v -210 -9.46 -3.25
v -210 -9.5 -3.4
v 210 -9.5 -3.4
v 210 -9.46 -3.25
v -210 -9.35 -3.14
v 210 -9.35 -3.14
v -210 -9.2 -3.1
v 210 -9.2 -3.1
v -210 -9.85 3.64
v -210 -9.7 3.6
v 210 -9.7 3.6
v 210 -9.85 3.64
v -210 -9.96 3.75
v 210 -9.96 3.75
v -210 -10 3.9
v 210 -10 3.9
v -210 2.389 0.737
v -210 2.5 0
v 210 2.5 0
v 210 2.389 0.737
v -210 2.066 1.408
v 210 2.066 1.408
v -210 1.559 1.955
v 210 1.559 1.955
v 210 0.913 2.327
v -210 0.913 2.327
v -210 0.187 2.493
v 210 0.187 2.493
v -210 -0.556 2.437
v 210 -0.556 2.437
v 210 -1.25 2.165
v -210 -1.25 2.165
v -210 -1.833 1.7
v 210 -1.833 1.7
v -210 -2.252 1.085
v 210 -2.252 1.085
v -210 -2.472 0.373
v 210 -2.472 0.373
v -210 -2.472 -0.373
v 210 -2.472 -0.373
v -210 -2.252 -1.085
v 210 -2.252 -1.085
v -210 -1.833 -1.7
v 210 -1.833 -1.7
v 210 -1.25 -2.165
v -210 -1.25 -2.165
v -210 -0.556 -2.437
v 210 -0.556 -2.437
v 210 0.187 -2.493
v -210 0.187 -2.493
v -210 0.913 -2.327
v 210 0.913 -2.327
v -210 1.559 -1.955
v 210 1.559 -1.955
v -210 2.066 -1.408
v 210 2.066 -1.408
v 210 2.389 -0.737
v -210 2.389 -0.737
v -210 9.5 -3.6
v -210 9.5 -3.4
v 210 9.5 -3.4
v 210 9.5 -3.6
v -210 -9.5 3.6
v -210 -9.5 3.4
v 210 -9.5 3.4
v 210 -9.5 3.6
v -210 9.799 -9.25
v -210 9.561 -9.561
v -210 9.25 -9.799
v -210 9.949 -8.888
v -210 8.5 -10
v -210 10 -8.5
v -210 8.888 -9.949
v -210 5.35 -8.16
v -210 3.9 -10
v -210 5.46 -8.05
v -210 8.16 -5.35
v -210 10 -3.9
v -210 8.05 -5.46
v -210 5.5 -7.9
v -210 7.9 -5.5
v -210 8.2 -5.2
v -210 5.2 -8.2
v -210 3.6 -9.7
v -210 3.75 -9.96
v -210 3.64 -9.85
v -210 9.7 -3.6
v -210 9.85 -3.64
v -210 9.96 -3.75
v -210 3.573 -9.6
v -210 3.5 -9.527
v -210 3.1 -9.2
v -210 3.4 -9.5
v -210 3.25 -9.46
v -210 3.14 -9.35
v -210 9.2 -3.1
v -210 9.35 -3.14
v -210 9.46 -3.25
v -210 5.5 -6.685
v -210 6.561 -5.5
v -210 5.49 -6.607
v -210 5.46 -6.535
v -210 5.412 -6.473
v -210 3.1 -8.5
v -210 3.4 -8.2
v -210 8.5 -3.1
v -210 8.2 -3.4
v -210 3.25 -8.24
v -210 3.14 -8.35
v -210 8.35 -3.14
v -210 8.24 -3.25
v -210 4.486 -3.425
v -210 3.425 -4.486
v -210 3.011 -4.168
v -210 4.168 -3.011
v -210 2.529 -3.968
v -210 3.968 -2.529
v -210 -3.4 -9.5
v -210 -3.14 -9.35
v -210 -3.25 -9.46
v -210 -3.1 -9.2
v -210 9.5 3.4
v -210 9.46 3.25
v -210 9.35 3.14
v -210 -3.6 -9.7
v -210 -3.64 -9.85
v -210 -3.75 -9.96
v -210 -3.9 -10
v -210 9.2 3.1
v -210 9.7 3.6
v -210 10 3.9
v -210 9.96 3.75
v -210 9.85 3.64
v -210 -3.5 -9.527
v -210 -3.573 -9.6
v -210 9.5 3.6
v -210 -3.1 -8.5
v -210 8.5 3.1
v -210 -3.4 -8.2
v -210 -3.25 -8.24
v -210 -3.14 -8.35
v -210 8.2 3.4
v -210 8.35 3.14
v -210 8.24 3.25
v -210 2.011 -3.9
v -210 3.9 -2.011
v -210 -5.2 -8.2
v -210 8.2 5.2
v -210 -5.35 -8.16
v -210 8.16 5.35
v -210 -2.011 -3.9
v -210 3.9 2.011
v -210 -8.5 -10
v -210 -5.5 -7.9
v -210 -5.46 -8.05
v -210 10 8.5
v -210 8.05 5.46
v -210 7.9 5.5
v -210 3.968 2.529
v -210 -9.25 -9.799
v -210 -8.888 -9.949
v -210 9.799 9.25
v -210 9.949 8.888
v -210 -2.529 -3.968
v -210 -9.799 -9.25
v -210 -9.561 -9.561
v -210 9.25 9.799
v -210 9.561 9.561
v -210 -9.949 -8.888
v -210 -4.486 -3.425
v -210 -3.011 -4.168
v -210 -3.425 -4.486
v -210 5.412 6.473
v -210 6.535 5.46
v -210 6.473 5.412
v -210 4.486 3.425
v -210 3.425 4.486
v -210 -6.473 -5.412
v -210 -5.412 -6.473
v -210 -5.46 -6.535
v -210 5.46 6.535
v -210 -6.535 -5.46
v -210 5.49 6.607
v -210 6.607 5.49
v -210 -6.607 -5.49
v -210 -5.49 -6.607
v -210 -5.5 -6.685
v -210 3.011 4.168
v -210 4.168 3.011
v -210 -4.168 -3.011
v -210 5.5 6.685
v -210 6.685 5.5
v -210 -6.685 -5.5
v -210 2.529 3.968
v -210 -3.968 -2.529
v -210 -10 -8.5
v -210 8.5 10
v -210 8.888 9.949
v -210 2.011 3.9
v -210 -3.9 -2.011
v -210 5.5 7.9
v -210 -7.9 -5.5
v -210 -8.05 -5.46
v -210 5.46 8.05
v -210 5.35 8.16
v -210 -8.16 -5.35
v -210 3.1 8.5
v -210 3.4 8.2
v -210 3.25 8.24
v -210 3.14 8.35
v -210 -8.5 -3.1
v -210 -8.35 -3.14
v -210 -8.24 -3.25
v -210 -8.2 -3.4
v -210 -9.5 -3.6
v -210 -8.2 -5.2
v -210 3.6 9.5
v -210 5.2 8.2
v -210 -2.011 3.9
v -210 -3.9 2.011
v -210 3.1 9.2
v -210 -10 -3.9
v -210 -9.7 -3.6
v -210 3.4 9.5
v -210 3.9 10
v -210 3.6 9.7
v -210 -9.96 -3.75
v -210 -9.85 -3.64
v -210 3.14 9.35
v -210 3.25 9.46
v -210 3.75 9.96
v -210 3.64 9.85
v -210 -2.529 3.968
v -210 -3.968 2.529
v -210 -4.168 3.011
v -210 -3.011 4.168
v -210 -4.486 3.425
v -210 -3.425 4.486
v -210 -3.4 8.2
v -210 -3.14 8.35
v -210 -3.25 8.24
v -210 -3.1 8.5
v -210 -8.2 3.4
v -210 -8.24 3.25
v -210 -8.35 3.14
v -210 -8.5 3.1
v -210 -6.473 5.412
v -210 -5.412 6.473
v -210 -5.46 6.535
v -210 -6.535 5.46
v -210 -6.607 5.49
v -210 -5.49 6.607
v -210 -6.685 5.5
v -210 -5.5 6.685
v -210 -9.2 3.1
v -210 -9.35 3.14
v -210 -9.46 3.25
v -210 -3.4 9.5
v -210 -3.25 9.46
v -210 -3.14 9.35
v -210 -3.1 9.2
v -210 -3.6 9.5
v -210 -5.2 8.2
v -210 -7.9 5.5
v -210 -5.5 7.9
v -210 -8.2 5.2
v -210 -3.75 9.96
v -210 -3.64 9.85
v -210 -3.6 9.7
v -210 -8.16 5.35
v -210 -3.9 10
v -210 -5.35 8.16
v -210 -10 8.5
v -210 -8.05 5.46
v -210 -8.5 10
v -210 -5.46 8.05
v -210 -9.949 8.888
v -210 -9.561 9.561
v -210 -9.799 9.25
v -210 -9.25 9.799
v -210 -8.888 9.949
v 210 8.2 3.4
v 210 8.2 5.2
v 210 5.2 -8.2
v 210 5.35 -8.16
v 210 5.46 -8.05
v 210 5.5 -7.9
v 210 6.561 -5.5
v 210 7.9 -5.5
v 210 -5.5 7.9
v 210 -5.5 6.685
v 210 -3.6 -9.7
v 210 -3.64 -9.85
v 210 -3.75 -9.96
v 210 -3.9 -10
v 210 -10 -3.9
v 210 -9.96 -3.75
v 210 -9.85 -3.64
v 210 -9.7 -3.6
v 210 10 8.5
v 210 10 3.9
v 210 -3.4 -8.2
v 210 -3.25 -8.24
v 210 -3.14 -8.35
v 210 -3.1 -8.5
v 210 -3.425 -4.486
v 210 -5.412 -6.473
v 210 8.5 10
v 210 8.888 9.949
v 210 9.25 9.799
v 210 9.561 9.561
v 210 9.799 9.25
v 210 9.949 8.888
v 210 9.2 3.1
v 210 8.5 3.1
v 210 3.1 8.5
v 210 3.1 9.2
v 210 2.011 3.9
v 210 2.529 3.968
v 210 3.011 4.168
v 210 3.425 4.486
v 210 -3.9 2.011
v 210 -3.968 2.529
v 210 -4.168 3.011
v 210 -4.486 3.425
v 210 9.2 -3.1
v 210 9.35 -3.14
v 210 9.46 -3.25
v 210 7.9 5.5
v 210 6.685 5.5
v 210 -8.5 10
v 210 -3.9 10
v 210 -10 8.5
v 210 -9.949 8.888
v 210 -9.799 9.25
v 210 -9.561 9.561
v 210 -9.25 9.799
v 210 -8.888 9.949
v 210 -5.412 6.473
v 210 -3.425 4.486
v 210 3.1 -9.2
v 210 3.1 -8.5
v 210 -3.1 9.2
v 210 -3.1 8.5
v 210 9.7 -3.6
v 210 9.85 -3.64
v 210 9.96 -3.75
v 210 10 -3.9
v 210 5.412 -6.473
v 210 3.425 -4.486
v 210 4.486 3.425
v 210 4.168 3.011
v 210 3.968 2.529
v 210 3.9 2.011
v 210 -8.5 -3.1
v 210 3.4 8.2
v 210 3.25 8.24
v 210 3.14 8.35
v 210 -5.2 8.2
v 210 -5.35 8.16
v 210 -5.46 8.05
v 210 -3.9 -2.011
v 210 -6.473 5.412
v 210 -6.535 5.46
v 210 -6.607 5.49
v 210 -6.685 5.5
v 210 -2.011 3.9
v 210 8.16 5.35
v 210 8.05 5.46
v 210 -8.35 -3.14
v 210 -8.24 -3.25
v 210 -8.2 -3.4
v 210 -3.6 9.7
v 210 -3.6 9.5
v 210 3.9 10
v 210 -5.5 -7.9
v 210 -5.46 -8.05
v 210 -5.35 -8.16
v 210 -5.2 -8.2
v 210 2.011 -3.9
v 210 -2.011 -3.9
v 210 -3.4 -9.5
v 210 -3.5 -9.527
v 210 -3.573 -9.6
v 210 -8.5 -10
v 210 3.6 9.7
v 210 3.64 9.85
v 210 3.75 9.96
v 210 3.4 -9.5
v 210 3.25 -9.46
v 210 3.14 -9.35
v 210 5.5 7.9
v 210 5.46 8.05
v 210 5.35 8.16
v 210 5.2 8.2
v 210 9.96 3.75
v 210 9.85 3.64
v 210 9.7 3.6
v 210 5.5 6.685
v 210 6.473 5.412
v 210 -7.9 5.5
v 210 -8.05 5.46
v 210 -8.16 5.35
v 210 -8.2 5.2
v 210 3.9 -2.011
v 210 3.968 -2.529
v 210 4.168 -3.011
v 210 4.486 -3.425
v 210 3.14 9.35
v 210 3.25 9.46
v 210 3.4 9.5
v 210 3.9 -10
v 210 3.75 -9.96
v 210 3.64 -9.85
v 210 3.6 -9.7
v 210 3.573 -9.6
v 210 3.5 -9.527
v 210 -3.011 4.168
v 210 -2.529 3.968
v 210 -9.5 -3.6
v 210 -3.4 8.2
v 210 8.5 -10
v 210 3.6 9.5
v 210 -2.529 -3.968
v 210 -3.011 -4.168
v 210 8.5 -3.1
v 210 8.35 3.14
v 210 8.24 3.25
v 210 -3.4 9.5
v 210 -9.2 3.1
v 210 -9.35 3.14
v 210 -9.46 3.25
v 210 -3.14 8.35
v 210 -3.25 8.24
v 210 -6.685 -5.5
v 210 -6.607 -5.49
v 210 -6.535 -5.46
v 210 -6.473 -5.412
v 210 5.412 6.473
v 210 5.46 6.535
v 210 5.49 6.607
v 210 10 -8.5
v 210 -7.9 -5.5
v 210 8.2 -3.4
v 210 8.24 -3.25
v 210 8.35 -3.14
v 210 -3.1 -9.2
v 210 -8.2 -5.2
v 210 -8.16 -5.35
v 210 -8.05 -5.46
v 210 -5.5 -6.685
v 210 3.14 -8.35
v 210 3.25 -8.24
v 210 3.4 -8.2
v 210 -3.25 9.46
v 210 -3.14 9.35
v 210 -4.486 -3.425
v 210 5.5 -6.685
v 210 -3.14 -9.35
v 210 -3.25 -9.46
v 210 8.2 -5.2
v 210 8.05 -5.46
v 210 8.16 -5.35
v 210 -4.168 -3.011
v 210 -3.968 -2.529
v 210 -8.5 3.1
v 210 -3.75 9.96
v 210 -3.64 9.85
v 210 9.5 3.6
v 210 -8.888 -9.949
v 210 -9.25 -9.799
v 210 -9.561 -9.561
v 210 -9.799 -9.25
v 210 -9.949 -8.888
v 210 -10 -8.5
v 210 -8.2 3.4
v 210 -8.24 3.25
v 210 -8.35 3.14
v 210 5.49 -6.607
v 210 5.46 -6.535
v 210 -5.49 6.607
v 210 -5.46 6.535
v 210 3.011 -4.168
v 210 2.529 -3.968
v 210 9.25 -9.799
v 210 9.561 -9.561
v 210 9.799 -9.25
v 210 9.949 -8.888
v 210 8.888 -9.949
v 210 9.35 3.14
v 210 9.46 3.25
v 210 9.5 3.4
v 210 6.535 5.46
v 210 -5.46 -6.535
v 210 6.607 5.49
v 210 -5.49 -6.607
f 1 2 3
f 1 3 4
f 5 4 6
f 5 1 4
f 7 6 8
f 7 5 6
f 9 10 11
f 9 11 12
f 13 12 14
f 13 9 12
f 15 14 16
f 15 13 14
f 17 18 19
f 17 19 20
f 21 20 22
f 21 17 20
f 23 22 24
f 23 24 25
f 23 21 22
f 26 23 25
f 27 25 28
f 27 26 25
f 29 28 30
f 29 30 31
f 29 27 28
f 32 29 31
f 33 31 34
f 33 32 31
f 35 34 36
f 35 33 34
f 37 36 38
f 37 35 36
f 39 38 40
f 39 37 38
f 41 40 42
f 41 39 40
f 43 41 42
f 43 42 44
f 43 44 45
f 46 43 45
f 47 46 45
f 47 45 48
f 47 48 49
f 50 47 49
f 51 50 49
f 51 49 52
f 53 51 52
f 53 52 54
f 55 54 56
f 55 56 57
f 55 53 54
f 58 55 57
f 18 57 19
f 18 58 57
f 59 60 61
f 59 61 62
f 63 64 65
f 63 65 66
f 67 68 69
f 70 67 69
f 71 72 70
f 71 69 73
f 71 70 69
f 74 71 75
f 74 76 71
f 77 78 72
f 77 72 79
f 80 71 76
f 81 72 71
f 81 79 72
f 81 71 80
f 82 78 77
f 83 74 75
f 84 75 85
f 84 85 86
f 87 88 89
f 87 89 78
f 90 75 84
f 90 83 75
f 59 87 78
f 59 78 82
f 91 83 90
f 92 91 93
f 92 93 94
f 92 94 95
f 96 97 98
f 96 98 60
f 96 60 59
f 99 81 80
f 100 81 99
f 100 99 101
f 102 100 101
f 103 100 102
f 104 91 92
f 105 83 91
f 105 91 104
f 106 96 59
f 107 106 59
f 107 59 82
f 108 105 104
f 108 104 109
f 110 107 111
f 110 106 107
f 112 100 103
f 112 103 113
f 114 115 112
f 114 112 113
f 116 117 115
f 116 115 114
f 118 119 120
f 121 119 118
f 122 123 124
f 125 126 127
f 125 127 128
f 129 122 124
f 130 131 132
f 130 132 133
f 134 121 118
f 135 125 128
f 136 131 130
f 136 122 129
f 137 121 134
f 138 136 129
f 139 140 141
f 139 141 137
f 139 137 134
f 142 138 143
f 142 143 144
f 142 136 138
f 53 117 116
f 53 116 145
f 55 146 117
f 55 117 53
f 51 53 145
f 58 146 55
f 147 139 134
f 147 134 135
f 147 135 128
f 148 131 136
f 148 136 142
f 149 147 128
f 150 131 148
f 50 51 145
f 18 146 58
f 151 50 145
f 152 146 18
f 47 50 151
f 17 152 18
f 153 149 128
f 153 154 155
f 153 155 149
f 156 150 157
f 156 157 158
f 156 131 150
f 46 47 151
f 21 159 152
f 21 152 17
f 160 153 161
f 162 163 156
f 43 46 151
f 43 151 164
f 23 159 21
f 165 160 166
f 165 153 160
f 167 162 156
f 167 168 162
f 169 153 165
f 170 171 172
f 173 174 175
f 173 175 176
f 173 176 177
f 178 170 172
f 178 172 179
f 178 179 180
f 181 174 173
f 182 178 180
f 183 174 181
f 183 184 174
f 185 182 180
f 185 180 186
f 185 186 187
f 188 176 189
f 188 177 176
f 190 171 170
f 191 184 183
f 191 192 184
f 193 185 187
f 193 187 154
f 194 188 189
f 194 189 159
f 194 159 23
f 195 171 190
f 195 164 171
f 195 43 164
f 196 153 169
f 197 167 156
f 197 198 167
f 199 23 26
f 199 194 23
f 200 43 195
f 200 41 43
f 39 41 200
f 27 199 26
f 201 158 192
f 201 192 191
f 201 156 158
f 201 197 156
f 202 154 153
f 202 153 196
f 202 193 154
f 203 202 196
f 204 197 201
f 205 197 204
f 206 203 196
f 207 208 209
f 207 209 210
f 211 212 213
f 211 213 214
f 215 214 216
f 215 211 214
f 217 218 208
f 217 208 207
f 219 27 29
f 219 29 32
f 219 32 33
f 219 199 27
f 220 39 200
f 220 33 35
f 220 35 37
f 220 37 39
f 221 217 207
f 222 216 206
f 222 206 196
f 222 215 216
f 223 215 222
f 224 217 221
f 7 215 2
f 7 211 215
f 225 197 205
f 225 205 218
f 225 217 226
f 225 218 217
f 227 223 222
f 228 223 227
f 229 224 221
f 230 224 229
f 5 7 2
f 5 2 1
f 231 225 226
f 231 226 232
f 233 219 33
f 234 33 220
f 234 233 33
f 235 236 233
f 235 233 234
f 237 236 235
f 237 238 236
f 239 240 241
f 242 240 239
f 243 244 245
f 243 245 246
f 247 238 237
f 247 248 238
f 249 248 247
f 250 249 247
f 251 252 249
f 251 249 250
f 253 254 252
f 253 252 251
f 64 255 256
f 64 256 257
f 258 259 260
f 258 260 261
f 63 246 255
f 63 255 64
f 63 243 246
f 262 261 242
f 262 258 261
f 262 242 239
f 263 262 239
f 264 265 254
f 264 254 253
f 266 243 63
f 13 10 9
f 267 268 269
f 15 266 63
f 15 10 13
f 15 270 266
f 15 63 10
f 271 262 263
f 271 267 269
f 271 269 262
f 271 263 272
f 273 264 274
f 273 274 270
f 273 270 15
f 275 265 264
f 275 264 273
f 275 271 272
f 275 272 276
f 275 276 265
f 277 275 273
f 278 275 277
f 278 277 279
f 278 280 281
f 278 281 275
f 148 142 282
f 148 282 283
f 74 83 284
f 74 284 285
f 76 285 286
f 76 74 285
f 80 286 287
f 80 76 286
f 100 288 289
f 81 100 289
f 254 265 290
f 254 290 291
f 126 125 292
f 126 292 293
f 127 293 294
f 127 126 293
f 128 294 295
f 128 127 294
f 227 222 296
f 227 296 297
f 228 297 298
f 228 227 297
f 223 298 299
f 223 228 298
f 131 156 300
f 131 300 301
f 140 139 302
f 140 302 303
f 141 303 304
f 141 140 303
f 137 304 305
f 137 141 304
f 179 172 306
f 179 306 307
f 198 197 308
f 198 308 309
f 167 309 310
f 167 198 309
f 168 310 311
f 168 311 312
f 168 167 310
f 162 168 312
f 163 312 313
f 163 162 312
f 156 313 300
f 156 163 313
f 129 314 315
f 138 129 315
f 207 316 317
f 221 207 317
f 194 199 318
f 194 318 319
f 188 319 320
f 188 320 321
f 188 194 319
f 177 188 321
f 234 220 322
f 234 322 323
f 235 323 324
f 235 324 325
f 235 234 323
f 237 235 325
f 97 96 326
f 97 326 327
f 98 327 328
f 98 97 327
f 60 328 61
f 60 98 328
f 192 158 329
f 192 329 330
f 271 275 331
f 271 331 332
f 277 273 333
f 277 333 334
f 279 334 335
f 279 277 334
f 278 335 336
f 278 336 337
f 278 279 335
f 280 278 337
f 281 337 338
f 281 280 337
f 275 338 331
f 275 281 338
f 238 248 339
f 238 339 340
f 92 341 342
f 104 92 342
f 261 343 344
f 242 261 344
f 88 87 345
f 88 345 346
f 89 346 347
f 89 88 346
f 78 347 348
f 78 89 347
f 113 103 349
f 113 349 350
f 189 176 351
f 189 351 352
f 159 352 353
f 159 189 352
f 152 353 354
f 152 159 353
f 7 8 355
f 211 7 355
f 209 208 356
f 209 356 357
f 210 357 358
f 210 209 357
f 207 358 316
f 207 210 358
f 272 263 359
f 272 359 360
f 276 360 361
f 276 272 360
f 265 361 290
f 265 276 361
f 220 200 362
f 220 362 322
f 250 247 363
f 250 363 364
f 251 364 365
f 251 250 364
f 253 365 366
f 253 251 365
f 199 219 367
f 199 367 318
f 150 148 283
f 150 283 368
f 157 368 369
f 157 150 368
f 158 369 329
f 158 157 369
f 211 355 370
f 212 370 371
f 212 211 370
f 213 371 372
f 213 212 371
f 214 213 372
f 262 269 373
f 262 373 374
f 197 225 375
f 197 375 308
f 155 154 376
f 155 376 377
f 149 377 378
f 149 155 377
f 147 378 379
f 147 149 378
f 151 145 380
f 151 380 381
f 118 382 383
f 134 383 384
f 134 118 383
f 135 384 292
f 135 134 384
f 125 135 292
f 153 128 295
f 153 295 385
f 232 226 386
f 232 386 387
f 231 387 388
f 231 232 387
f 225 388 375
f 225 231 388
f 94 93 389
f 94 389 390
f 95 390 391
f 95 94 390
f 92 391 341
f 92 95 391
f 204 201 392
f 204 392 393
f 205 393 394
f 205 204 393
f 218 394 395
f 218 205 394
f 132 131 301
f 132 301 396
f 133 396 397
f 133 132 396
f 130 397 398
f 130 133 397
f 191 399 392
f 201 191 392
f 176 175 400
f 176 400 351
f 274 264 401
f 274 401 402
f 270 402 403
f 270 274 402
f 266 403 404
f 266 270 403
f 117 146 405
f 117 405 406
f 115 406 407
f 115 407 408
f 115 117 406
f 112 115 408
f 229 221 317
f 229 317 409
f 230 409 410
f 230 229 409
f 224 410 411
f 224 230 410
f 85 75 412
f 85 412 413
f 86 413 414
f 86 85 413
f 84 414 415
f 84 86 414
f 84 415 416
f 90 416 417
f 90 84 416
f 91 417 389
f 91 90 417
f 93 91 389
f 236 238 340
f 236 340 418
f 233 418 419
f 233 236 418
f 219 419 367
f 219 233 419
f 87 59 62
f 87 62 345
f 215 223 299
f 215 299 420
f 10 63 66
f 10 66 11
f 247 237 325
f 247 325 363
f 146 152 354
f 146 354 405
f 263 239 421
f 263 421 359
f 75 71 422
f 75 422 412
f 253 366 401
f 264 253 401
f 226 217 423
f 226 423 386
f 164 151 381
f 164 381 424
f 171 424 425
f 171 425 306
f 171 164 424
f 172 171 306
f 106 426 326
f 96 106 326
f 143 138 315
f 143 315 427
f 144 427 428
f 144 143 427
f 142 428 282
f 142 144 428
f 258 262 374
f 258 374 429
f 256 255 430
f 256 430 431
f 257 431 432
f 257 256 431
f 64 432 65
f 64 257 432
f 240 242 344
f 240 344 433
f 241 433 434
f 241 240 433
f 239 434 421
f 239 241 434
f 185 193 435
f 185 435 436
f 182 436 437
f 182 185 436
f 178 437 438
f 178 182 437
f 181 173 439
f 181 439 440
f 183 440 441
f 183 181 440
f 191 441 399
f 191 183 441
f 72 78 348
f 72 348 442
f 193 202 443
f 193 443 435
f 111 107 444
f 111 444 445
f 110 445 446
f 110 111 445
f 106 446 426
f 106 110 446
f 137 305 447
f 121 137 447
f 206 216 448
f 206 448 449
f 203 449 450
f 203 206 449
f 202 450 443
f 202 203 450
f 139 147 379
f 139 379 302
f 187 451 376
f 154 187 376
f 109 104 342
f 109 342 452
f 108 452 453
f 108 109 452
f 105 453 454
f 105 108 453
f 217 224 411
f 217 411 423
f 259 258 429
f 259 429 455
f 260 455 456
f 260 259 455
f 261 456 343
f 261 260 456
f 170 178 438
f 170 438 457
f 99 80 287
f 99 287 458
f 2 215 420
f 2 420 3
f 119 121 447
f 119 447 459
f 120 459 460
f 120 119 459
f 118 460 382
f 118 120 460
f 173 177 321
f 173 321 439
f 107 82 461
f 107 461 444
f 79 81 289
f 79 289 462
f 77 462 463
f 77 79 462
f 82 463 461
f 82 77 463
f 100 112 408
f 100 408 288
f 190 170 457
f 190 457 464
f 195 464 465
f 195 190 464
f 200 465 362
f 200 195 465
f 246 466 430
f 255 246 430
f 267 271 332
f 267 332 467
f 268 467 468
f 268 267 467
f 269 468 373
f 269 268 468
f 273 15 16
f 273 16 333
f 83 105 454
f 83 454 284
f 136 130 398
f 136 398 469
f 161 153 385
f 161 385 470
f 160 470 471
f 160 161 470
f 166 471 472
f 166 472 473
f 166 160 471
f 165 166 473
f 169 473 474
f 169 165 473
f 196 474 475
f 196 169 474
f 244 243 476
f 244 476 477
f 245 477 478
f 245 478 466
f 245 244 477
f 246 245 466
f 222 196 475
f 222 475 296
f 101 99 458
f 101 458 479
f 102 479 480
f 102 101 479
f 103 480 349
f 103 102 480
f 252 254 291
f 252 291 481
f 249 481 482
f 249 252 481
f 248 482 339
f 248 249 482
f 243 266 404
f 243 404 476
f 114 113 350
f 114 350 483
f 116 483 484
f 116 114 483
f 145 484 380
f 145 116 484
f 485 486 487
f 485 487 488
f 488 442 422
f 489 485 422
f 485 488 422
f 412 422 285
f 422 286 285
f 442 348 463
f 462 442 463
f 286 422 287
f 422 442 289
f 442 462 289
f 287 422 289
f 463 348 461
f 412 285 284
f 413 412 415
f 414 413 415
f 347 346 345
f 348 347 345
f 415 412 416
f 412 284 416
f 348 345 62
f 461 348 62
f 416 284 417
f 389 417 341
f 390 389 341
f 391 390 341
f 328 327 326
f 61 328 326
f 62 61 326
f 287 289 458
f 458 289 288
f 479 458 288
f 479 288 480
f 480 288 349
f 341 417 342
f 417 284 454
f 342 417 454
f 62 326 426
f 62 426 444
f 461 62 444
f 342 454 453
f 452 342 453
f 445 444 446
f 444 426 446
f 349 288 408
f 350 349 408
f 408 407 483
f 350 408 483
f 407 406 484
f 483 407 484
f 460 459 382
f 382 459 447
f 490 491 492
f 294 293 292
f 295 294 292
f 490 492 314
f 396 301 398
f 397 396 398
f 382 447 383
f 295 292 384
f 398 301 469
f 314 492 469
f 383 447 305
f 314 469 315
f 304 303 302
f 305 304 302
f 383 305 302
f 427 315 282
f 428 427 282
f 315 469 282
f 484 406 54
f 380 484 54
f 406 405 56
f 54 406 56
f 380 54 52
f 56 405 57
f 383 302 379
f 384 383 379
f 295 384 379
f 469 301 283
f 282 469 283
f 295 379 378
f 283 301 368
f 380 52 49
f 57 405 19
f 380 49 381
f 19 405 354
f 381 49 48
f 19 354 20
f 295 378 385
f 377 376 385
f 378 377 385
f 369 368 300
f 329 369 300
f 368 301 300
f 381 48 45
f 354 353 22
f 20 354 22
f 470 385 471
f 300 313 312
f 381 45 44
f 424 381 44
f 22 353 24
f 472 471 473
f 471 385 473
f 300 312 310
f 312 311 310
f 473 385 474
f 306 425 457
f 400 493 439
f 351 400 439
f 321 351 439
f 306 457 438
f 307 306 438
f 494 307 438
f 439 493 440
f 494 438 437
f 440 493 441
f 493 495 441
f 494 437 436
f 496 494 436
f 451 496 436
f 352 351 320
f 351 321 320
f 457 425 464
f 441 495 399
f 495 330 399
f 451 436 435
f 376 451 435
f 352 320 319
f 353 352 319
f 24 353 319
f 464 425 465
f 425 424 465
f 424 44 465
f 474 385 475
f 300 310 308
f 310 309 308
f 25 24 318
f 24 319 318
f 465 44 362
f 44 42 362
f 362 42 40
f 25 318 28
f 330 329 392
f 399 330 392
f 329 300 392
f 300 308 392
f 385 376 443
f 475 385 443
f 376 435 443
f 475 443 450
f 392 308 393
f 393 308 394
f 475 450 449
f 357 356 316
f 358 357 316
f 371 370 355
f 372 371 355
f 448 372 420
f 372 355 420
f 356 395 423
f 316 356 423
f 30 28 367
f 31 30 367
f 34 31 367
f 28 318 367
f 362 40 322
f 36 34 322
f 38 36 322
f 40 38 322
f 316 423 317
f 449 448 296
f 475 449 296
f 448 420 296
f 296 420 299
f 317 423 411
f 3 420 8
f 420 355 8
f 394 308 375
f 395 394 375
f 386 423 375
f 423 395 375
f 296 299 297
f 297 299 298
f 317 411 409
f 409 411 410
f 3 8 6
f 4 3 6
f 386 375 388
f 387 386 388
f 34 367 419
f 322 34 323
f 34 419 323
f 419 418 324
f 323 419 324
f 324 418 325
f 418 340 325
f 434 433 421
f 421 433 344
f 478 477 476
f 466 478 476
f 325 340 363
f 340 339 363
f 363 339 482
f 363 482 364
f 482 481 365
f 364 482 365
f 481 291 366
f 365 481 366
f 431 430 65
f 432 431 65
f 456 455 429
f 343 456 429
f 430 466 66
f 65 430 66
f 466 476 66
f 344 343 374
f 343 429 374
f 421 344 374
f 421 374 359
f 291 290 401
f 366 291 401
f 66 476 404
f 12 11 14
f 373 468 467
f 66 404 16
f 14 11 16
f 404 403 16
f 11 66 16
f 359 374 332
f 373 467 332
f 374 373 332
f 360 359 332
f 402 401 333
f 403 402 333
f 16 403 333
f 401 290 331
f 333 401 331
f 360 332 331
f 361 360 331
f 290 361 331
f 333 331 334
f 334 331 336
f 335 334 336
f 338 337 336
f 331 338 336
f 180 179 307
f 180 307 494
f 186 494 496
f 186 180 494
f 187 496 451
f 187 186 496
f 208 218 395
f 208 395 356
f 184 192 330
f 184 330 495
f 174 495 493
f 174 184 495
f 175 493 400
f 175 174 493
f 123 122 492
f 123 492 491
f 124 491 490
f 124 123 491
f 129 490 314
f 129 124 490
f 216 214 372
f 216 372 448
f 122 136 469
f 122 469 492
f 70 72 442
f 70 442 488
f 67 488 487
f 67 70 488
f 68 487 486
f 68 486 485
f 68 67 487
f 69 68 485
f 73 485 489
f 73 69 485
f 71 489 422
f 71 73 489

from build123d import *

# Parameters (mm, degrees)
SKETCH_11_R         = 2.5
MEMBER_2020_1_DEPTH = 420


with BuildPart() as part:
    # 草图11 → Member 2020_1 (new body)
    with BuildSketch(Plane.YZ.offset(-210)):
        with BuildLine():
            Line((3.9, 0), (3.9, -2.010912703))
            ThreePointArc((3.9, -2.010912703), (4.052240935, -2.776279568), (4.485786438, -3.425126266))
            Line((4.485786438, -3.425126266), (6.560660172, -5.5))
            Line((6.560660172, -5.5), (7.9, -5.5))
            ThreePointArc((7.9, -5.5), (8.112132034, -5.412132034), (8.2, -5.2))
            Line((8.2, -5.2), (8.2, -3.4))
            ThreePointArc((8.2, -3.4), (8.287867966, -3.187867966), (8.5, -3.1))
            Line((8.5, -3.1), (9.2, -3.1))
            ThreePointArc((9.2, -3.1), (9.412132034, -3.187867966), (9.5, -3.4))
            Line((9.5, -3.4), (9.5, -3.6))
            Line((9.5, -3.6), (9.7, -3.6))
            ThreePointArc((9.7, -3.6), (9.912132034, -3.687867966), (10, -3.9))
            Line((10, -3.9), (10, -8.5))
            ThreePointArc((10, -8.5), (9.560660172, -9.560660172), (8.5, -10))
            Line((8.5, -10), (3.9, -10))
            ThreePointArc((3.9, -10), (3.687867966, -9.912132034), (3.6, -9.7))
            ThreePointArc((3.6, -9.7), (3.541421356, -9.558578644), (3.4, -9.5))
            ThreePointArc((3.4, -9.5), (3.187867966, -9.412132034), (3.1, -9.2))
            Line((3.1, -9.2), (3.1, -8.5))
            ThreePointArc((3.1, -8.5), (3.187867966, -8.287867966), (3.4, -8.2))
            Line((3.4, -8.2), (5.2, -8.2))
            ThreePointArc((5.2, -8.2), (5.412132034, -8.112132034), (5.5, -7.9))
            Line((5.5, -7.9), (5.5, -6.68492424))
            ThreePointArc((5.5, -6.68492424), (5.47716386, -6.570119211), (5.412132034, -6.472792206))
            Line((5.412132034, -6.472792206), (3.425126266, -4.485786438))
            ThreePointArc((3.425126266, -4.485786438), (2.776279568, -4.052240935), (2.010912703, -3.9))
            Line((2.010912703, -3.9), (0, -3.9))
            Line((0, -3.9), (-2.010912703, -3.9))
            ThreePointArc((-2.010912703, -3.9), (-2.776279568, -4.052240935), (-3.425126266, -4.485786438))
            Line((-3.425126266, -4.485786438), (-5.412132034, -6.472792206))
            ThreePointArc((-5.412132034, -6.472792206), (-5.47716386, -6.570119211), (-5.5, -6.68492424))
            Line((-5.5, -6.68492424), (-5.5, -7.9))
            ThreePointArc((-5.5, -7.9), (-5.412132034, -8.112132034), (-5.2, -8.2))
            Line((-5.2, -8.2), (-3.4, -8.2))
            ThreePointArc((-3.4, -8.2), (-3.187867966, -8.287867966), (-3.1, -8.5))
            Line((-3.1, -8.5), (-3.1, -9.2))
            ThreePointArc((-3.1, -9.2), (-3.187867966, -9.412132034), (-3.4, -9.5))
            ThreePointArc((-3.4, -9.5), (-3.541421356, -9.558578644), (-3.6, -9.7))
            ThreePointArc((-3.6, -9.7), (-3.687867966, -9.912132034), (-3.9, -10))
            Line((-3.9, -10), (-8.5, -10))
            ThreePointArc((-8.5, -10), (-9.560660172, -9.560660172), (-10, -8.5))
            Line((-10, -8.5), (-10, -3.9))
            ThreePointArc((-10, -3.9), (-9.912132034, -3.687867966), (-9.7, -3.6))
            Line((-9.7, -3.6), (-9.5, -3.6))
            Line((-9.5, -3.6), (-9.5, -3.4))
            ThreePointArc((-9.5, -3.4), (-9.412132034, -3.187867966), (-9.2, -3.1))
            Line((-9.2, -3.1), (-8.5, -3.1))
            ThreePointArc((-8.5, -3.1), (-8.287867965, -3.187867966), (-8.2, -3.4))
            Line((-8.2, -3.4), (-8.2, -5.2))
            ThreePointArc((-8.2, -5.2), (-8.112132034, -5.412132034), (-7.9, -5.5))
            Line((-7.9, -5.5), (-6.68492424, -5.5))
            ThreePointArc((-6.68492424, -5.5), (-6.570119211, -5.47716386), (-6.472792206, -5.412132034))
            Line((-6.472792206, -5.412132034), (-4.485786438, -3.425126266))
            ThreePointArc((-4.485786438, -3.425126266), (-4.052240935, -2.776279568), (-3.9, -2.010912703))
            Line((-3.9, -2.010912703), (-3.9, 0))
            Line((-3.9, 0), (-3.9, 2.010912703))
            ThreePointArc((-3.9, 2.010912703), (-4.052240935, 2.776279568), (-4.485786438, 3.425126266))
            Line((-4.485786438, 3.425126266), (-6.472792206, 5.412132034))
            ThreePointArc((-6.472792206, 5.412132034), (-6.570119211, 5.47716386), (-6.68492424, 5.5))
            Line((-6.68492424, 5.5), (-7.9, 5.5))
            ThreePointArc((-7.9, 5.5), (-8.112132034, 5.412132034), (-8.2, 5.2))
            Line((-8.2, 5.2), (-8.2, 3.4))
            ThreePointArc((-8.2, 3.4), (-8.287867965, 3.187867966), (-8.5, 3.1))
            Line((-8.5, 3.1), (-9.2, 3.1))
            ThreePointArc((-9.2, 3.1), (-9.412132034, 3.187867966), (-9.5, 3.4))
            Line((-9.5, 3.4), (-9.5, 3.6))
            Line((-9.5, 3.6), (-9.7, 3.6))
            ThreePointArc((-9.7, 3.6), (-9.912132034, 3.687867966), (-10, 3.9))
            Line((-10, 3.9), (-10, 8.5))
            ThreePointArc((-10, 8.5), (-9.560660172, 9.560660172), (-8.5, 10))
            Line((-8.5, 10), (-3.9, 10))
            ThreePointArc((-3.9, 10), (-3.687867966, 9.912132034), (-3.6, 9.7))
            Line((-3.6, 9.7), (-3.6, 9.5))
            Line((-3.6, 9.5), (-3.4, 9.5))
            ThreePointArc((-3.4, 9.5), (-3.187867966, 9.412132034), (-3.1, 9.2))
            Line((-3.1, 9.2), (-3.1, 8.5))
            ThreePointArc((-3.1, 8.5), (-3.187867966, 8.287867966), (-3.4, 8.2))
            Line((-3.4, 8.2), (-5.2, 8.2))
            ThreePointArc((-5.2, 8.2), (-5.412132034, 8.112132034), (-5.5, 7.9))
            Line((-5.5, 7.9), (-5.5, 6.68492424))
            ThreePointArc((-5.5, 6.68492424), (-5.47716386, 6.570119211), (-5.412132034, 6.472792206))
            Line((-5.412132034, 6.472792206), (-3.425126266, 4.485786438))
            ThreePointArc((-3.425126266, 4.485786438), (-2.776279568, 4.052240935), (-2.010912703, 3.9))
            Line((-2.010912703, 3.9), (0, 3.9))
            Line((0, 3.9), (2.010912703, 3.9))
            ThreePointArc((2.010912703, 3.9), (2.776279568, 4.052240935), (3.425126266, 4.485786438))
            Line((3.425126266, 4.485786438), (5.412132034, 6.472792206))
            ThreePointArc((5.412132034, 6.472792206), (5.47716386, 6.570119211), (5.5, 6.68492424))
            Line((5.5, 6.68492424), (5.5, 7.9))
            ThreePointArc((5.5, 7.9), (5.412132034, 8.112132034), (5.2, 8.2))
            Line((5.2, 8.2), (3.4, 8.2))
            ThreePointArc((3.4, 8.2), (3.187867966, 8.287867966), (3.1, 8.5))
            Line((3.1, 8.5), (3.1, 9.2))
            ThreePointArc((3.1, 9.2), (3.187867966, 9.412132034), (3.4, 9.5))
            Line((3.4, 9.5), (3.6, 9.5))
            Line((3.6, 9.5), (3.6, 9.7))
            ThreePointArc((3.6, 9.7), (3.687867966, 9.912132034), (3.9, 10))
            Line((3.9, 10), (8.5, 10))
            ThreePointArc((8.5, 10), (9.560660172, 9.560660172), (10, 8.5))
            Line((10, 8.5), (10, 3.9))
            ThreePointArc((10, 3.9), (9.912132034, 3.687867966), (9.7, 3.6))
            Line((9.7, 3.6), (9.5, 3.6))
            Line((9.5, 3.6), (9.5, 3.4))
            ThreePointArc((9.5, 3.4), (9.412132034, 3.187867966), (9.2, 3.1))
            Line((9.2, 3.1), (8.5, 3.1))
            ThreePointArc((8.5, 3.1), (8.287867966, 3.187867966), (8.2, 3.4))
            Line((8.2, 3.4), (8.2, 5.2))
            ThreePointArc((8.2, 5.2), (8.112132034, 5.412132034), (7.9, 5.5))
            Line((7.9, 5.5), (6.68492424, 5.5))
            ThreePointArc((6.68492424, 5.5), (6.570119211, 5.47716386), (6.472792206, 5.412132034))
            Line((6.472792206, 5.412132034), (4.485786438, 3.425126266))
            ThreePointArc((4.485786438, 3.425126266), (4.052240935, 2.776279568), (3.9, 2.010912703))
            Line((3.9, 2.010912703), (3.9, 0))
        make_face()
        Circle(SKETCH_11_R, mode=Mode.SUBTRACT)
    extrude(amount=MEMBER_2020_1_DEPTH)


solid = part.part
